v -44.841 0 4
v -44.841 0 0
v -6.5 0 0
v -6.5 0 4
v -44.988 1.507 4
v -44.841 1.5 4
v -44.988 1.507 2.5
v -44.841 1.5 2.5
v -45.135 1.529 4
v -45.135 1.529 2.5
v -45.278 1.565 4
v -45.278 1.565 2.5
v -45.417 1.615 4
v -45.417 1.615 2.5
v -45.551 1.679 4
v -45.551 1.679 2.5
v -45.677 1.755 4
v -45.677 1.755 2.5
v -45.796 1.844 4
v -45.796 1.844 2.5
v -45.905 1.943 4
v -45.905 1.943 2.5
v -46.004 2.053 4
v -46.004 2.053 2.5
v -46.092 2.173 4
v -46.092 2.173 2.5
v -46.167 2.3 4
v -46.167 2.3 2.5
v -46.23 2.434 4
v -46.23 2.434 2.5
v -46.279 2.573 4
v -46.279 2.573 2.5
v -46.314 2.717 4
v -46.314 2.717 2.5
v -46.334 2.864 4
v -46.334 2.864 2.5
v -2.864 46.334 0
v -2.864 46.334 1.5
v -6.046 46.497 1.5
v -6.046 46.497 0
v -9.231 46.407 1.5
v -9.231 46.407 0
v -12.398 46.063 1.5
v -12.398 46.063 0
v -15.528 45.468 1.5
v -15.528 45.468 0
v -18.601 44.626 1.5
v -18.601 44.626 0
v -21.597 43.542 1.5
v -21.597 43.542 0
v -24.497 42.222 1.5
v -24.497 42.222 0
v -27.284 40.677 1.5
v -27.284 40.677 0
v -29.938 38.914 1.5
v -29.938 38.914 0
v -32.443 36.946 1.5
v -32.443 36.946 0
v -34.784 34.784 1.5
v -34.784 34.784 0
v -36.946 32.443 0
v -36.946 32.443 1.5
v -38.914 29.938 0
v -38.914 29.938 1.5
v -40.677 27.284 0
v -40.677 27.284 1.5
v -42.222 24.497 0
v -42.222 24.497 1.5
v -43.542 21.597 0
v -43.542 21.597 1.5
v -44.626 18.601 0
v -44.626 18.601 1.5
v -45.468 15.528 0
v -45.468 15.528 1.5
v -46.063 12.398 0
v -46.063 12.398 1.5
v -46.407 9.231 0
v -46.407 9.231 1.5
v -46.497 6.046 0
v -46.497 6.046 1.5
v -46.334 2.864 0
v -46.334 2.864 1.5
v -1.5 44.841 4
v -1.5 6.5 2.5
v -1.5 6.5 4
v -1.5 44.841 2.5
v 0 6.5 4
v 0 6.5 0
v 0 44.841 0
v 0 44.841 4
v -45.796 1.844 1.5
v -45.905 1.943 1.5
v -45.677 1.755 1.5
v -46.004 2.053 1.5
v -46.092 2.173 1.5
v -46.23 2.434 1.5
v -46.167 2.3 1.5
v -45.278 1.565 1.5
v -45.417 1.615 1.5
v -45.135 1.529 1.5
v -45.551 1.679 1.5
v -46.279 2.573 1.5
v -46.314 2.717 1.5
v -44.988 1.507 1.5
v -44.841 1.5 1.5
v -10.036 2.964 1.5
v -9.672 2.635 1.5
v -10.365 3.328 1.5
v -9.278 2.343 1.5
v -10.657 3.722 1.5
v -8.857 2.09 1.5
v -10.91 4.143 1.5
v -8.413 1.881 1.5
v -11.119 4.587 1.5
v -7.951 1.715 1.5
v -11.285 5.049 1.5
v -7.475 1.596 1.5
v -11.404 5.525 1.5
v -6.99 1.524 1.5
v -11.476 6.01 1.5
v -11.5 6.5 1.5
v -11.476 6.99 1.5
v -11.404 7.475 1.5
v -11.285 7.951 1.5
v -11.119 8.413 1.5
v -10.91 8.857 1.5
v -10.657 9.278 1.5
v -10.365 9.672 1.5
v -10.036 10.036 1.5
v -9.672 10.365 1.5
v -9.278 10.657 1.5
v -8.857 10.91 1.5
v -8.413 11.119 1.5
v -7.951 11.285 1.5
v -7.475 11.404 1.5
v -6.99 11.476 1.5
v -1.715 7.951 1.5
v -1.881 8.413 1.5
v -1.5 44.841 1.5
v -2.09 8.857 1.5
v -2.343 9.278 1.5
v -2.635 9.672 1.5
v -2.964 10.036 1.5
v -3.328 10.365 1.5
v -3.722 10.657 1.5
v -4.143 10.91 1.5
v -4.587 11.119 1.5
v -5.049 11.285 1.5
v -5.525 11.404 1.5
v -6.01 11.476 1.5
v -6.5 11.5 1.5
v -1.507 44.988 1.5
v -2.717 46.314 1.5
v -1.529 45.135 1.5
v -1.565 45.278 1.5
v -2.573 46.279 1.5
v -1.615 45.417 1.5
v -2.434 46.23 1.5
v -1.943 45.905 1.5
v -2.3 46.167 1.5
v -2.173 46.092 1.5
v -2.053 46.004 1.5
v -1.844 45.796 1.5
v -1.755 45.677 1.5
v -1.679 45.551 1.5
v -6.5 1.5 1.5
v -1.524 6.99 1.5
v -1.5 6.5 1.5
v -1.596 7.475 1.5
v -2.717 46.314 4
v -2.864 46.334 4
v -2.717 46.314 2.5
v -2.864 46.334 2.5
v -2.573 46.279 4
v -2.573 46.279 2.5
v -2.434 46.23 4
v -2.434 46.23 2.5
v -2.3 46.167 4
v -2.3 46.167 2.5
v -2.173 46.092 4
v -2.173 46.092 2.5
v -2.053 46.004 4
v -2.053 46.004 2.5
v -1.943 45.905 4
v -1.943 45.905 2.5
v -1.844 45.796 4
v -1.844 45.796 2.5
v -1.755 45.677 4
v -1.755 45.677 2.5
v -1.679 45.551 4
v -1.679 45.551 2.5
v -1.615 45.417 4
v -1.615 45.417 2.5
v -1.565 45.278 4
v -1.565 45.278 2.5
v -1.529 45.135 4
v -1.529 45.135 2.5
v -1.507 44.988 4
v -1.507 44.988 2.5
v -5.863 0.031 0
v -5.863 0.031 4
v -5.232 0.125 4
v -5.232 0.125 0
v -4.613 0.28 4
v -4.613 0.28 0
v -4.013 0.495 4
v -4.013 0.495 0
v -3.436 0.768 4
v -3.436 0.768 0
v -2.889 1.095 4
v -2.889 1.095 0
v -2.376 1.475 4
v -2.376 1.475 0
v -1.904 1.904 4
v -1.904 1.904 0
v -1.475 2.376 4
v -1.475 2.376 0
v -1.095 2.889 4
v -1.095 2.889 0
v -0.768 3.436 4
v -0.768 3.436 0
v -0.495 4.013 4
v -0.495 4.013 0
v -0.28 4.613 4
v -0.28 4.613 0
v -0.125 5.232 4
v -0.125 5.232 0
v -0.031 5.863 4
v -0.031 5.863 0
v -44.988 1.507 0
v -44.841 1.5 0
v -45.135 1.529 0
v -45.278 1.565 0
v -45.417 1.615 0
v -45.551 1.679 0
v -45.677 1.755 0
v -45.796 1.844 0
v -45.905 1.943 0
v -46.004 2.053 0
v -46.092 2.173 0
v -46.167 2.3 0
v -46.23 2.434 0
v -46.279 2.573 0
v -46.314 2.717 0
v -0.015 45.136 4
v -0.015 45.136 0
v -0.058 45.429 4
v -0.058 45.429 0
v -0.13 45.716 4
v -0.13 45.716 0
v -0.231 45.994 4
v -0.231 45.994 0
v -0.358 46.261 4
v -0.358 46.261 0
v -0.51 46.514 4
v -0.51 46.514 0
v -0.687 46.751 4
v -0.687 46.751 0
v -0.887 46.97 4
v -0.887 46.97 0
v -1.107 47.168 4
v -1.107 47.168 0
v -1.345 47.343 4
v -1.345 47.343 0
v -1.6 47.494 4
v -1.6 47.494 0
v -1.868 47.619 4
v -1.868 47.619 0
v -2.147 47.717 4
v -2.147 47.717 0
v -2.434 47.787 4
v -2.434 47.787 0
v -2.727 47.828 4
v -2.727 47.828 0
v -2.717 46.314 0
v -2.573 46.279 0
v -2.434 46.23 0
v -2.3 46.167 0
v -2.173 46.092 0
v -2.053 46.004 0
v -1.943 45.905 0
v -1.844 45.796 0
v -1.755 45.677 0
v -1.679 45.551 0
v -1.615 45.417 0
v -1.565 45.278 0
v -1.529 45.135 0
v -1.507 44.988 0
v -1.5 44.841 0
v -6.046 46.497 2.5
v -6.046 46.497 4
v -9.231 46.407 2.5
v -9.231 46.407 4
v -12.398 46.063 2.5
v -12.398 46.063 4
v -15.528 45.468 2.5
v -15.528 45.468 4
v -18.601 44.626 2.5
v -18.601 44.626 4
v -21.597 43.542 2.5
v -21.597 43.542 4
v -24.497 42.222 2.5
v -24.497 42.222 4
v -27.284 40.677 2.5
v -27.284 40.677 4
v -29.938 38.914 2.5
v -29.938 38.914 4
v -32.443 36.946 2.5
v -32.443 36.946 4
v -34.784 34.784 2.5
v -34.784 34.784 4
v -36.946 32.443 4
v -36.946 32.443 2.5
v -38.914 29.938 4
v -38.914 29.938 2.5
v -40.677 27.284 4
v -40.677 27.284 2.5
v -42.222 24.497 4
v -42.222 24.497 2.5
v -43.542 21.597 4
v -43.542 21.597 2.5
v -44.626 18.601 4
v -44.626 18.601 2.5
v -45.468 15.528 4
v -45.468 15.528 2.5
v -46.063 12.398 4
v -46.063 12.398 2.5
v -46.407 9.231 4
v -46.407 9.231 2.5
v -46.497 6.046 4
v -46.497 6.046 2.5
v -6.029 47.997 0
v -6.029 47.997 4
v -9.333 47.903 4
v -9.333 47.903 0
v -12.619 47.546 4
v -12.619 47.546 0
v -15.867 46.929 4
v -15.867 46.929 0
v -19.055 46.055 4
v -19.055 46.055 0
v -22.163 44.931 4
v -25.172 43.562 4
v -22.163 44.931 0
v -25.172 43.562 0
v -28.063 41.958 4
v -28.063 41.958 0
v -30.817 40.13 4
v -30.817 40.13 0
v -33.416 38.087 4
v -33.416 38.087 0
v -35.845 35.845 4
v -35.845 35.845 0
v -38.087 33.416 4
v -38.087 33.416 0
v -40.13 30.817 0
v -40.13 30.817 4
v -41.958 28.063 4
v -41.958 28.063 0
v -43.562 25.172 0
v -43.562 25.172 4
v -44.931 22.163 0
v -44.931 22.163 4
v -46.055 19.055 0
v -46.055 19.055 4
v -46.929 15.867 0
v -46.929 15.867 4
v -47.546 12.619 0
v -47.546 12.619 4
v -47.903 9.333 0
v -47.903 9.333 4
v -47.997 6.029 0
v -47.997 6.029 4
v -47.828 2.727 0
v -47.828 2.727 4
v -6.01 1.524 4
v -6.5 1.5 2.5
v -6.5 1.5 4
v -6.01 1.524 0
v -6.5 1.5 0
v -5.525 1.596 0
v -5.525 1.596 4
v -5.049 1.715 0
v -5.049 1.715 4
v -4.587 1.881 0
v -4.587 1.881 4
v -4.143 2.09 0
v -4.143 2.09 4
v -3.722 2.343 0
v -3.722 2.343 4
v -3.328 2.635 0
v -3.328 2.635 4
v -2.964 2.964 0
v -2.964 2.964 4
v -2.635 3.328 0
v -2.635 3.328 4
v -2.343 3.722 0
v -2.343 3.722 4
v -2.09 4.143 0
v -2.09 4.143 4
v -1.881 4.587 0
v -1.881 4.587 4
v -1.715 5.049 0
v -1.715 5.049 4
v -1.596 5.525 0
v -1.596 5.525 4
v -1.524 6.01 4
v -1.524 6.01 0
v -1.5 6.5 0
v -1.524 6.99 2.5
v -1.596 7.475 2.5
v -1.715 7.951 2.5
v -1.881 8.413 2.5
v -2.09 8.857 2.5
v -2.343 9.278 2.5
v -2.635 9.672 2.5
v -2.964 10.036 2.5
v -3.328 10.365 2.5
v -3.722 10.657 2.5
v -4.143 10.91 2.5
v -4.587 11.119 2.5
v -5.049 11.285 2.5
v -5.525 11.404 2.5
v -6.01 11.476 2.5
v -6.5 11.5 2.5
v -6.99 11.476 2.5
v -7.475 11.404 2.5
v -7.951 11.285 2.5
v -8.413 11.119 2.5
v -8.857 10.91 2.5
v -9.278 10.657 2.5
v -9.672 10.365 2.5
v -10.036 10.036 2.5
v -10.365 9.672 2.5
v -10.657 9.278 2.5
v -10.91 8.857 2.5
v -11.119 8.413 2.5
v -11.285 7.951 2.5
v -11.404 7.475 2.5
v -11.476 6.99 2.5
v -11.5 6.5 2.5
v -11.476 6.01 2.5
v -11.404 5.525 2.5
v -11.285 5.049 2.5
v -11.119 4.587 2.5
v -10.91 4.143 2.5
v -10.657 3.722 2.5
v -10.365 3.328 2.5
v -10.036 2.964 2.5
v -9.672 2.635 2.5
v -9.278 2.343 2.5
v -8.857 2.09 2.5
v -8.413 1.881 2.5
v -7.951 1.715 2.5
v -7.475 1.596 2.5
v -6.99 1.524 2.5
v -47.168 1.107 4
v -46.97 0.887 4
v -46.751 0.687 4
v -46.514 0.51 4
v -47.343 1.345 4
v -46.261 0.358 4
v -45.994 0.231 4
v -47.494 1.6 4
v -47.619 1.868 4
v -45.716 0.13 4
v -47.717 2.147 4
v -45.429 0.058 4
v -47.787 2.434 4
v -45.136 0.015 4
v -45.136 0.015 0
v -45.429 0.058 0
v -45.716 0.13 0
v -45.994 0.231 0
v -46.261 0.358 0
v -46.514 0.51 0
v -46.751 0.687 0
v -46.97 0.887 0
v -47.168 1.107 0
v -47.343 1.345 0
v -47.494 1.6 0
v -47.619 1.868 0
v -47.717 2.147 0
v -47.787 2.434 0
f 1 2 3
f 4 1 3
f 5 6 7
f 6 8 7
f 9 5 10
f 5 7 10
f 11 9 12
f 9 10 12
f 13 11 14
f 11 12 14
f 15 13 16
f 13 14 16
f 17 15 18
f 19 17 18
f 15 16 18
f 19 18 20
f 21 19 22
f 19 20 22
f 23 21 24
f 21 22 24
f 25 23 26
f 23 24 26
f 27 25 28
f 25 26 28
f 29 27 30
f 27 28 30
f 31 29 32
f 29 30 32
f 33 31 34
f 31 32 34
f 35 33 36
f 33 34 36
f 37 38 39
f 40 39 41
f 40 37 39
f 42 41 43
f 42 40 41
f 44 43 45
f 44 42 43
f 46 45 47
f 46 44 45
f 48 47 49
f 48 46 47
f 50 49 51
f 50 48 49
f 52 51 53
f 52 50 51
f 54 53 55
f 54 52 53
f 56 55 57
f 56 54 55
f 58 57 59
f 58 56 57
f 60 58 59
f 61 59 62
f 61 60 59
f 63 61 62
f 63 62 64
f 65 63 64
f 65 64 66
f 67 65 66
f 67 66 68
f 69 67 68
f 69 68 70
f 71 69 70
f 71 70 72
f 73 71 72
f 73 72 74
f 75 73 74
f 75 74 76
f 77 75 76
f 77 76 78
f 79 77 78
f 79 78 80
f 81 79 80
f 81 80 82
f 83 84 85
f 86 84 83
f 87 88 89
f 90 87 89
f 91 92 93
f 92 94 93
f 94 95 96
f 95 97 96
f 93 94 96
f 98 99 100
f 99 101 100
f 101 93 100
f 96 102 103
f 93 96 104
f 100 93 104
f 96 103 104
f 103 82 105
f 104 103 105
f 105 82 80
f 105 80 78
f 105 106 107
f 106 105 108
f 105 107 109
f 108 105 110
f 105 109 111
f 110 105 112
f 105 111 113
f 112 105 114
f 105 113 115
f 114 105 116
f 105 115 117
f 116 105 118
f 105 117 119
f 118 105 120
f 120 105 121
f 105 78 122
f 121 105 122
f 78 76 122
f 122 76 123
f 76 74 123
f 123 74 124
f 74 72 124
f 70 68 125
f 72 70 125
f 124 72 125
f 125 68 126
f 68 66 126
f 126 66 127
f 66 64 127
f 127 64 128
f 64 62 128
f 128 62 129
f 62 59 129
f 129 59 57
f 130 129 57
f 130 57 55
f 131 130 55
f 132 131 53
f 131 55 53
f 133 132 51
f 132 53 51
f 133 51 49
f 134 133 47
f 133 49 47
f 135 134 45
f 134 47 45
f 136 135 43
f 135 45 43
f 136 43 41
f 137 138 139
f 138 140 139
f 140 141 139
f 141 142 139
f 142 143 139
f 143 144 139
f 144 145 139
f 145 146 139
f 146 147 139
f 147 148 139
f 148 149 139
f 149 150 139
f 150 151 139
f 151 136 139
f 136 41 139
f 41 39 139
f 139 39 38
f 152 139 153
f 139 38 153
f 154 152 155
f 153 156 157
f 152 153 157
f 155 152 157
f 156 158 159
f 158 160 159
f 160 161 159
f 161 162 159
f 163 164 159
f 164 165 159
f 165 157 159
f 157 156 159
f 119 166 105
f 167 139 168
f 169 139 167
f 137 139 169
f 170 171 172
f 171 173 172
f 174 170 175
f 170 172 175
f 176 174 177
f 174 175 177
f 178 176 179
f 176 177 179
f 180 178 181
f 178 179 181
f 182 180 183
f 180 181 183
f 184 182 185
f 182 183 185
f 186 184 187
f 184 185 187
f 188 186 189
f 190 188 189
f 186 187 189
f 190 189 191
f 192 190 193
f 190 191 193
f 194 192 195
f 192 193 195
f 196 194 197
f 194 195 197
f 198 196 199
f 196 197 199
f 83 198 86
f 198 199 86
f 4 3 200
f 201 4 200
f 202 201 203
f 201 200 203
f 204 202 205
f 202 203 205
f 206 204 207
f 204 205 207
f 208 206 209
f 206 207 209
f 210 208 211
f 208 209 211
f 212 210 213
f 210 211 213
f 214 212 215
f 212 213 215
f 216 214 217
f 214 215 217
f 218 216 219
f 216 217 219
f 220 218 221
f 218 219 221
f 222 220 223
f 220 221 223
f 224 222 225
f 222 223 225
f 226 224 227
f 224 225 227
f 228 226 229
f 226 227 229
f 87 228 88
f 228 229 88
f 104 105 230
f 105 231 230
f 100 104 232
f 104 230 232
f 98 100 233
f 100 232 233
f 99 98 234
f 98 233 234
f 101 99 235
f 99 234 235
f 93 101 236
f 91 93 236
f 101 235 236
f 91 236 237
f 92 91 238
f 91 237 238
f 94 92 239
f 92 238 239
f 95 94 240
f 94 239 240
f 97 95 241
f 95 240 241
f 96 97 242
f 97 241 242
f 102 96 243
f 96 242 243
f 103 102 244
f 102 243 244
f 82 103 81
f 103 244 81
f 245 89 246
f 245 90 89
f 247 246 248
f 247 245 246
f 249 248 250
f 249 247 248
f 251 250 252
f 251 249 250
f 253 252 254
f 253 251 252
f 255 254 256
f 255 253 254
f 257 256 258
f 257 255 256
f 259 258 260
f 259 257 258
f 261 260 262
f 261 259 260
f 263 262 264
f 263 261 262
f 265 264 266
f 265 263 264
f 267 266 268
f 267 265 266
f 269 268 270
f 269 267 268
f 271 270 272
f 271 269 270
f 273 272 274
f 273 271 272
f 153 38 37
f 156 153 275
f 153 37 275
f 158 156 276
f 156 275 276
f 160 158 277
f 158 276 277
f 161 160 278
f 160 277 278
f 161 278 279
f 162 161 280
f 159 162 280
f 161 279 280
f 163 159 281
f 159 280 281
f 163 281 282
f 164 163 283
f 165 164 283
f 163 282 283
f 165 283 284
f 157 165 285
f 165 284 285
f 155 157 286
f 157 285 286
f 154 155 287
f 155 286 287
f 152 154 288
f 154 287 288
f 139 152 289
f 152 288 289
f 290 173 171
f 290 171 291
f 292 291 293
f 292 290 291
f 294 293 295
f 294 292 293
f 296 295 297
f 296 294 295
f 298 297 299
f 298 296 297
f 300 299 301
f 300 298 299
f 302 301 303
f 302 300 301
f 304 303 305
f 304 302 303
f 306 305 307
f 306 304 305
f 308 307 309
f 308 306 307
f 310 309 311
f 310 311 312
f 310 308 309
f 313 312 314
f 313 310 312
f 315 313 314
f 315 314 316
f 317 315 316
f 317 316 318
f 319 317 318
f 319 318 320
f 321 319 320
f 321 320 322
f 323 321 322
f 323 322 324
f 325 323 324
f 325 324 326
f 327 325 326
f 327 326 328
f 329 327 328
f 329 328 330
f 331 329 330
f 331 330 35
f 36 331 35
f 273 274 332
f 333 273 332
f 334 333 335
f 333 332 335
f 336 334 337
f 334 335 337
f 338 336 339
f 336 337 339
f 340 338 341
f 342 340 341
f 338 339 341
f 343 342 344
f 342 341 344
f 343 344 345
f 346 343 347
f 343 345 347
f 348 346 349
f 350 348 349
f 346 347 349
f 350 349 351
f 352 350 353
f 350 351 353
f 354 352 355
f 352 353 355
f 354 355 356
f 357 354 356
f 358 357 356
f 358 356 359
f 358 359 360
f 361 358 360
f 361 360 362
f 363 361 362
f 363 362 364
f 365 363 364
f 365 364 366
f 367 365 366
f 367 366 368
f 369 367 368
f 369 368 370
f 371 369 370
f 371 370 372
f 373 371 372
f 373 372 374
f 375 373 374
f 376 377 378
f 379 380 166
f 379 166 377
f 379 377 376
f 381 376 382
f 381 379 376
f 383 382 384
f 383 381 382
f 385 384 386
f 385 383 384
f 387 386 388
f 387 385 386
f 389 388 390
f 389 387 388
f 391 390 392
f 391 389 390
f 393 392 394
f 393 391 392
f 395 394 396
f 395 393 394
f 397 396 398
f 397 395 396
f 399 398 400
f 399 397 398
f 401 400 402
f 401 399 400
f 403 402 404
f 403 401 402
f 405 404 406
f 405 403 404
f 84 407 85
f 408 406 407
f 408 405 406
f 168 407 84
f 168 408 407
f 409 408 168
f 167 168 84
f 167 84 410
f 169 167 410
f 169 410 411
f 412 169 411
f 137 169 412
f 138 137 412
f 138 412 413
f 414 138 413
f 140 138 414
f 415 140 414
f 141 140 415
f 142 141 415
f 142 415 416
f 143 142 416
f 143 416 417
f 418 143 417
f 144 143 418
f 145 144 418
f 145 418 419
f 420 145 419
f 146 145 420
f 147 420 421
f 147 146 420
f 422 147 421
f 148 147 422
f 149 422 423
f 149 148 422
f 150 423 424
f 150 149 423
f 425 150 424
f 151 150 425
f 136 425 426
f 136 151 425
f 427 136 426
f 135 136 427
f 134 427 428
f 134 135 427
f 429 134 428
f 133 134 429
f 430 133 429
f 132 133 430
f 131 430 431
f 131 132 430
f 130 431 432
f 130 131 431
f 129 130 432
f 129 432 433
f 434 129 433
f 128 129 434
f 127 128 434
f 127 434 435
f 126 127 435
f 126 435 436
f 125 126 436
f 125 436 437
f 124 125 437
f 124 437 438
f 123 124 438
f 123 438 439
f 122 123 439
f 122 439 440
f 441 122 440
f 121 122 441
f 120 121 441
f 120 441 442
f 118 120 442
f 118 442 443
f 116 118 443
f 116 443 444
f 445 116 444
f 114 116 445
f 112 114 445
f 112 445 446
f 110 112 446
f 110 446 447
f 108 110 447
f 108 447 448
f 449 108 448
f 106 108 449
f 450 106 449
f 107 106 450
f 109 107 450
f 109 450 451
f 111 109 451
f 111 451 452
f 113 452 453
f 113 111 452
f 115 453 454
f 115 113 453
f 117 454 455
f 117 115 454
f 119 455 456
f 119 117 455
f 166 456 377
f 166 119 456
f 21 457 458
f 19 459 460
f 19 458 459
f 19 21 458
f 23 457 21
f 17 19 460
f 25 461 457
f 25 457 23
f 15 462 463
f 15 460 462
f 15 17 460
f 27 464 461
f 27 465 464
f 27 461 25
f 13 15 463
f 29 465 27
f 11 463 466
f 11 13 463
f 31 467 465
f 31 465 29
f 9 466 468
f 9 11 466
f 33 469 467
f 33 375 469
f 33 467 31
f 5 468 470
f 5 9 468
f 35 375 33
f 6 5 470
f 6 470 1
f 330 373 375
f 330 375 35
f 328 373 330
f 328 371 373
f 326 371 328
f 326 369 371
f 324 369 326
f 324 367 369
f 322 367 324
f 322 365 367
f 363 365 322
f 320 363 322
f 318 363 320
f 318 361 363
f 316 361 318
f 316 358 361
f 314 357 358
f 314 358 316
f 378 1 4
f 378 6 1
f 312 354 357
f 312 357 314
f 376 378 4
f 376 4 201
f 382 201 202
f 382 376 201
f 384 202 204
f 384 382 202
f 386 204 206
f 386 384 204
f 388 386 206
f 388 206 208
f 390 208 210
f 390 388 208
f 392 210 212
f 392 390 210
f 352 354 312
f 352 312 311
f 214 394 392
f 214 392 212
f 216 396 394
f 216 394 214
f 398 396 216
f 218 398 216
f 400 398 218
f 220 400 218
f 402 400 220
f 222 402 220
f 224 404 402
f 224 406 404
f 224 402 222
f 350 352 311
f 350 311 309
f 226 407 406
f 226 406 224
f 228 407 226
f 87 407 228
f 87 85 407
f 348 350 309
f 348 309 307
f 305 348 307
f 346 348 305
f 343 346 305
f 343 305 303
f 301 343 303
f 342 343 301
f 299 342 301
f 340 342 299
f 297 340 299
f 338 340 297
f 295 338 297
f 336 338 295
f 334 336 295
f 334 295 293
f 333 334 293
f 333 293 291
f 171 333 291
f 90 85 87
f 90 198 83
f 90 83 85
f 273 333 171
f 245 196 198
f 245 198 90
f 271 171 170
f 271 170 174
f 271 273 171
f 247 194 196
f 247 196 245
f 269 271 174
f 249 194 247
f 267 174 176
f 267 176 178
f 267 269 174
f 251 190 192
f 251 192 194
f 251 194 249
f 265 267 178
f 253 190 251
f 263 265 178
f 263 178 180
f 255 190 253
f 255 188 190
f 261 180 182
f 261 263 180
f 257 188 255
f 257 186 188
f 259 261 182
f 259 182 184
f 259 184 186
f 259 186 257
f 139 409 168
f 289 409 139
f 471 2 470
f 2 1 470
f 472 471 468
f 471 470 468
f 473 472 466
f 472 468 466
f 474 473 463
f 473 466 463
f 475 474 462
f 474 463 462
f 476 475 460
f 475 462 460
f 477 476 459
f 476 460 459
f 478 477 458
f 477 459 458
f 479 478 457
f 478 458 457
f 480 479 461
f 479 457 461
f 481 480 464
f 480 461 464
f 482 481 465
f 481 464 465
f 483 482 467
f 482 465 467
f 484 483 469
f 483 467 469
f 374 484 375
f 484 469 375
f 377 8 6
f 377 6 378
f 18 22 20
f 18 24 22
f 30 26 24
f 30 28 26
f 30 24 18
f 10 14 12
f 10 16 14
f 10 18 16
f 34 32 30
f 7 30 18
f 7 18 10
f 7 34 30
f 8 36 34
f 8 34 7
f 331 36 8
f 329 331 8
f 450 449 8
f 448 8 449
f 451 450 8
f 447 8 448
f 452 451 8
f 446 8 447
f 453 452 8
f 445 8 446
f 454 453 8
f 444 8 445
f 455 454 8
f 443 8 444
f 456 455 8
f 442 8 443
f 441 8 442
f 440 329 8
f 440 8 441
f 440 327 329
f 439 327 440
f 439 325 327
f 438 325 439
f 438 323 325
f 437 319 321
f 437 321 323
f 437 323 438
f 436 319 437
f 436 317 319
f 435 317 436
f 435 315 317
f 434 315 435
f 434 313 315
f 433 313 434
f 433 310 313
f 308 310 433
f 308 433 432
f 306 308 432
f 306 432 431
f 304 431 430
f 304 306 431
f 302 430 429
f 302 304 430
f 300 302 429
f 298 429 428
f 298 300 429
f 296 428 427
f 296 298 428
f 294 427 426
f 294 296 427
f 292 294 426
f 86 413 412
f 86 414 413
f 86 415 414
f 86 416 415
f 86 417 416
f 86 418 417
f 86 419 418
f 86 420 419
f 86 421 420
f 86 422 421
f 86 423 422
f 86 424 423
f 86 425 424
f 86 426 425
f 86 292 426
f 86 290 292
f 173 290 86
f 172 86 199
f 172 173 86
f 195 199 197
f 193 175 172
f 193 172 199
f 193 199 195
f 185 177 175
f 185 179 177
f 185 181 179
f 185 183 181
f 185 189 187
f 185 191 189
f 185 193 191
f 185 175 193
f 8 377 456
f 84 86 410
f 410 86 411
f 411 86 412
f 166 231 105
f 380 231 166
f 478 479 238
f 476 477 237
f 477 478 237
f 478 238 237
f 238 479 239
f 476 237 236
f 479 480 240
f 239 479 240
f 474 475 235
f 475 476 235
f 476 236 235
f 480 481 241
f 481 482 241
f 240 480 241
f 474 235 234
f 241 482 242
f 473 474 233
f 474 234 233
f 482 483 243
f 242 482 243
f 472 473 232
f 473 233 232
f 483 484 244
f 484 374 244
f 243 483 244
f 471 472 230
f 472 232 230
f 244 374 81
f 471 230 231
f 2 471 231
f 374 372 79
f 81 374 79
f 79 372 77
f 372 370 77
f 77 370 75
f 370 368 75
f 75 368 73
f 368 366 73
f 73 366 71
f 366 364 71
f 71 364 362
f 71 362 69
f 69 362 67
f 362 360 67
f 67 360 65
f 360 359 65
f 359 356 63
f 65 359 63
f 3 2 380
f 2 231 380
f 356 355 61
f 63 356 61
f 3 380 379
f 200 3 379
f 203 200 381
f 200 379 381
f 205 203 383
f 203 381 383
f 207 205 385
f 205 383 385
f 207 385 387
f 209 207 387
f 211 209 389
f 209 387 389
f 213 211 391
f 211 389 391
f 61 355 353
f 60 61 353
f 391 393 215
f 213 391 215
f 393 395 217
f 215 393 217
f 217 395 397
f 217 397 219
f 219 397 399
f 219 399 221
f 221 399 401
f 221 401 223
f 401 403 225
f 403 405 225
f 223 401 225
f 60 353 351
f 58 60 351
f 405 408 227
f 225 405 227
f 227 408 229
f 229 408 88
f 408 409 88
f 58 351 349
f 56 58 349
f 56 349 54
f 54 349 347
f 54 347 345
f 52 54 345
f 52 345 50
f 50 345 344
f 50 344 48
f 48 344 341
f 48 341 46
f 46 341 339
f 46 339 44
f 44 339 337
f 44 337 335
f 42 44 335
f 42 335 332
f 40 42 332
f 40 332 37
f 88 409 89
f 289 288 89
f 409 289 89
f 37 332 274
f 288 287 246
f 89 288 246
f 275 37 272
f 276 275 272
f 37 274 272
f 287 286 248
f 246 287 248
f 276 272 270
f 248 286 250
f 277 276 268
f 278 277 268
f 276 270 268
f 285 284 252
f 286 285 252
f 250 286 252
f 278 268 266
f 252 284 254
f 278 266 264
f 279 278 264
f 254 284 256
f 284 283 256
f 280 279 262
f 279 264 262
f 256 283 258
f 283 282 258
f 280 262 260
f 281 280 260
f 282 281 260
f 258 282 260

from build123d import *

# Parameters (mm, degrees)
F1_DEPTH = 4
F2_T     = -1.5
F5_DEPTH = 1
F6_R     = 3
F7_R     = 1.5
F9_DEPTH = 25


with BuildPart() as f1:
    # F0 (on Top) → F1 (new body)
    with BuildSketch(Plane.XY):
        with BuildLine():
            ThreePointArc((-6.5, 0), (-1.9038059223, 1.9038059223), (0, 6.5))
            Line((0, 6.5), (0, 47.4878030638))
            ThreePointArc((0, 47.4878030638), (-35.8449314192, 35.8449314192), (-47.4878030638, 0))
            Line((-47.4878030638, 0), (-13, 0))
            Line((-13, 0), (-6.5, 0))
        make_face()
    extrude(amount=F1_DEPTH)

    # F2
    f2_openings = [f1.faces().sort_by_distance(p)[0] for p in [
        (-21.274509, 21.274509, 4),
        (-21.274509, 21.274509, 0),
    ]]
    offset(amount=F2_T, openings=f2_openings)

    # F4 (on offset) → F5 (join)
    with BuildSketch(Plane.XY.offset(1.5)):
        with BuildLine():
            Line((-46.186269666, 1.5), (-6.5, 1.5))
            ThreePointArc((-6.5, 1.5), (-2.9644660941, 2.9644660941), (-1.5, 6.5))
            Line((-1.5, 6.5), (-1.5, 46.186269666))
            ThreePointArc((-1.5, 46.186269666), (-34.7842712475, 34.7842712475), (-46.186269666, 1.5))
        make_face()
    extrude(amount=F5_DEPTH)

    # F6
    f6_edges = [f1.edges().sort_by_distance(p)[0] for p in [
        (0, 47.487803, 2),
        (-47.487803, 0, 2),
    ]]
    fillet(f6_edges, radius=F6_R)

    # F7
    f7_edges = [f1.edges().sort_by_distance(p)[0] for p in [
        (-1.5, 46.18627, 0.75),
        (-46.18627, 1.5, 0.75),
        (-46.18627, 1.5, 3.25),
        (-1.5, 46.18627, 3.25),
    ]]
    fillet(f7_edges, radius=F7_R)

    # F8 (on face) → F9 (cut)
    with BuildSketch(Plane.XY.offset(4)):
        with BuildLine():
            ThreePointArc((-6.5, 1.5), (-2.9644660941, 2.9644660941), (-1.5, 6.5))
            ThreePointArc((-1.5, 6.5), (-10.0355339059, 10.0355339059), (-6.5, 1.5))
        make_face()
    extrude(amount=-F9_DEPTH, mode=Mode.SUBTRACT)


solid = f1.part
